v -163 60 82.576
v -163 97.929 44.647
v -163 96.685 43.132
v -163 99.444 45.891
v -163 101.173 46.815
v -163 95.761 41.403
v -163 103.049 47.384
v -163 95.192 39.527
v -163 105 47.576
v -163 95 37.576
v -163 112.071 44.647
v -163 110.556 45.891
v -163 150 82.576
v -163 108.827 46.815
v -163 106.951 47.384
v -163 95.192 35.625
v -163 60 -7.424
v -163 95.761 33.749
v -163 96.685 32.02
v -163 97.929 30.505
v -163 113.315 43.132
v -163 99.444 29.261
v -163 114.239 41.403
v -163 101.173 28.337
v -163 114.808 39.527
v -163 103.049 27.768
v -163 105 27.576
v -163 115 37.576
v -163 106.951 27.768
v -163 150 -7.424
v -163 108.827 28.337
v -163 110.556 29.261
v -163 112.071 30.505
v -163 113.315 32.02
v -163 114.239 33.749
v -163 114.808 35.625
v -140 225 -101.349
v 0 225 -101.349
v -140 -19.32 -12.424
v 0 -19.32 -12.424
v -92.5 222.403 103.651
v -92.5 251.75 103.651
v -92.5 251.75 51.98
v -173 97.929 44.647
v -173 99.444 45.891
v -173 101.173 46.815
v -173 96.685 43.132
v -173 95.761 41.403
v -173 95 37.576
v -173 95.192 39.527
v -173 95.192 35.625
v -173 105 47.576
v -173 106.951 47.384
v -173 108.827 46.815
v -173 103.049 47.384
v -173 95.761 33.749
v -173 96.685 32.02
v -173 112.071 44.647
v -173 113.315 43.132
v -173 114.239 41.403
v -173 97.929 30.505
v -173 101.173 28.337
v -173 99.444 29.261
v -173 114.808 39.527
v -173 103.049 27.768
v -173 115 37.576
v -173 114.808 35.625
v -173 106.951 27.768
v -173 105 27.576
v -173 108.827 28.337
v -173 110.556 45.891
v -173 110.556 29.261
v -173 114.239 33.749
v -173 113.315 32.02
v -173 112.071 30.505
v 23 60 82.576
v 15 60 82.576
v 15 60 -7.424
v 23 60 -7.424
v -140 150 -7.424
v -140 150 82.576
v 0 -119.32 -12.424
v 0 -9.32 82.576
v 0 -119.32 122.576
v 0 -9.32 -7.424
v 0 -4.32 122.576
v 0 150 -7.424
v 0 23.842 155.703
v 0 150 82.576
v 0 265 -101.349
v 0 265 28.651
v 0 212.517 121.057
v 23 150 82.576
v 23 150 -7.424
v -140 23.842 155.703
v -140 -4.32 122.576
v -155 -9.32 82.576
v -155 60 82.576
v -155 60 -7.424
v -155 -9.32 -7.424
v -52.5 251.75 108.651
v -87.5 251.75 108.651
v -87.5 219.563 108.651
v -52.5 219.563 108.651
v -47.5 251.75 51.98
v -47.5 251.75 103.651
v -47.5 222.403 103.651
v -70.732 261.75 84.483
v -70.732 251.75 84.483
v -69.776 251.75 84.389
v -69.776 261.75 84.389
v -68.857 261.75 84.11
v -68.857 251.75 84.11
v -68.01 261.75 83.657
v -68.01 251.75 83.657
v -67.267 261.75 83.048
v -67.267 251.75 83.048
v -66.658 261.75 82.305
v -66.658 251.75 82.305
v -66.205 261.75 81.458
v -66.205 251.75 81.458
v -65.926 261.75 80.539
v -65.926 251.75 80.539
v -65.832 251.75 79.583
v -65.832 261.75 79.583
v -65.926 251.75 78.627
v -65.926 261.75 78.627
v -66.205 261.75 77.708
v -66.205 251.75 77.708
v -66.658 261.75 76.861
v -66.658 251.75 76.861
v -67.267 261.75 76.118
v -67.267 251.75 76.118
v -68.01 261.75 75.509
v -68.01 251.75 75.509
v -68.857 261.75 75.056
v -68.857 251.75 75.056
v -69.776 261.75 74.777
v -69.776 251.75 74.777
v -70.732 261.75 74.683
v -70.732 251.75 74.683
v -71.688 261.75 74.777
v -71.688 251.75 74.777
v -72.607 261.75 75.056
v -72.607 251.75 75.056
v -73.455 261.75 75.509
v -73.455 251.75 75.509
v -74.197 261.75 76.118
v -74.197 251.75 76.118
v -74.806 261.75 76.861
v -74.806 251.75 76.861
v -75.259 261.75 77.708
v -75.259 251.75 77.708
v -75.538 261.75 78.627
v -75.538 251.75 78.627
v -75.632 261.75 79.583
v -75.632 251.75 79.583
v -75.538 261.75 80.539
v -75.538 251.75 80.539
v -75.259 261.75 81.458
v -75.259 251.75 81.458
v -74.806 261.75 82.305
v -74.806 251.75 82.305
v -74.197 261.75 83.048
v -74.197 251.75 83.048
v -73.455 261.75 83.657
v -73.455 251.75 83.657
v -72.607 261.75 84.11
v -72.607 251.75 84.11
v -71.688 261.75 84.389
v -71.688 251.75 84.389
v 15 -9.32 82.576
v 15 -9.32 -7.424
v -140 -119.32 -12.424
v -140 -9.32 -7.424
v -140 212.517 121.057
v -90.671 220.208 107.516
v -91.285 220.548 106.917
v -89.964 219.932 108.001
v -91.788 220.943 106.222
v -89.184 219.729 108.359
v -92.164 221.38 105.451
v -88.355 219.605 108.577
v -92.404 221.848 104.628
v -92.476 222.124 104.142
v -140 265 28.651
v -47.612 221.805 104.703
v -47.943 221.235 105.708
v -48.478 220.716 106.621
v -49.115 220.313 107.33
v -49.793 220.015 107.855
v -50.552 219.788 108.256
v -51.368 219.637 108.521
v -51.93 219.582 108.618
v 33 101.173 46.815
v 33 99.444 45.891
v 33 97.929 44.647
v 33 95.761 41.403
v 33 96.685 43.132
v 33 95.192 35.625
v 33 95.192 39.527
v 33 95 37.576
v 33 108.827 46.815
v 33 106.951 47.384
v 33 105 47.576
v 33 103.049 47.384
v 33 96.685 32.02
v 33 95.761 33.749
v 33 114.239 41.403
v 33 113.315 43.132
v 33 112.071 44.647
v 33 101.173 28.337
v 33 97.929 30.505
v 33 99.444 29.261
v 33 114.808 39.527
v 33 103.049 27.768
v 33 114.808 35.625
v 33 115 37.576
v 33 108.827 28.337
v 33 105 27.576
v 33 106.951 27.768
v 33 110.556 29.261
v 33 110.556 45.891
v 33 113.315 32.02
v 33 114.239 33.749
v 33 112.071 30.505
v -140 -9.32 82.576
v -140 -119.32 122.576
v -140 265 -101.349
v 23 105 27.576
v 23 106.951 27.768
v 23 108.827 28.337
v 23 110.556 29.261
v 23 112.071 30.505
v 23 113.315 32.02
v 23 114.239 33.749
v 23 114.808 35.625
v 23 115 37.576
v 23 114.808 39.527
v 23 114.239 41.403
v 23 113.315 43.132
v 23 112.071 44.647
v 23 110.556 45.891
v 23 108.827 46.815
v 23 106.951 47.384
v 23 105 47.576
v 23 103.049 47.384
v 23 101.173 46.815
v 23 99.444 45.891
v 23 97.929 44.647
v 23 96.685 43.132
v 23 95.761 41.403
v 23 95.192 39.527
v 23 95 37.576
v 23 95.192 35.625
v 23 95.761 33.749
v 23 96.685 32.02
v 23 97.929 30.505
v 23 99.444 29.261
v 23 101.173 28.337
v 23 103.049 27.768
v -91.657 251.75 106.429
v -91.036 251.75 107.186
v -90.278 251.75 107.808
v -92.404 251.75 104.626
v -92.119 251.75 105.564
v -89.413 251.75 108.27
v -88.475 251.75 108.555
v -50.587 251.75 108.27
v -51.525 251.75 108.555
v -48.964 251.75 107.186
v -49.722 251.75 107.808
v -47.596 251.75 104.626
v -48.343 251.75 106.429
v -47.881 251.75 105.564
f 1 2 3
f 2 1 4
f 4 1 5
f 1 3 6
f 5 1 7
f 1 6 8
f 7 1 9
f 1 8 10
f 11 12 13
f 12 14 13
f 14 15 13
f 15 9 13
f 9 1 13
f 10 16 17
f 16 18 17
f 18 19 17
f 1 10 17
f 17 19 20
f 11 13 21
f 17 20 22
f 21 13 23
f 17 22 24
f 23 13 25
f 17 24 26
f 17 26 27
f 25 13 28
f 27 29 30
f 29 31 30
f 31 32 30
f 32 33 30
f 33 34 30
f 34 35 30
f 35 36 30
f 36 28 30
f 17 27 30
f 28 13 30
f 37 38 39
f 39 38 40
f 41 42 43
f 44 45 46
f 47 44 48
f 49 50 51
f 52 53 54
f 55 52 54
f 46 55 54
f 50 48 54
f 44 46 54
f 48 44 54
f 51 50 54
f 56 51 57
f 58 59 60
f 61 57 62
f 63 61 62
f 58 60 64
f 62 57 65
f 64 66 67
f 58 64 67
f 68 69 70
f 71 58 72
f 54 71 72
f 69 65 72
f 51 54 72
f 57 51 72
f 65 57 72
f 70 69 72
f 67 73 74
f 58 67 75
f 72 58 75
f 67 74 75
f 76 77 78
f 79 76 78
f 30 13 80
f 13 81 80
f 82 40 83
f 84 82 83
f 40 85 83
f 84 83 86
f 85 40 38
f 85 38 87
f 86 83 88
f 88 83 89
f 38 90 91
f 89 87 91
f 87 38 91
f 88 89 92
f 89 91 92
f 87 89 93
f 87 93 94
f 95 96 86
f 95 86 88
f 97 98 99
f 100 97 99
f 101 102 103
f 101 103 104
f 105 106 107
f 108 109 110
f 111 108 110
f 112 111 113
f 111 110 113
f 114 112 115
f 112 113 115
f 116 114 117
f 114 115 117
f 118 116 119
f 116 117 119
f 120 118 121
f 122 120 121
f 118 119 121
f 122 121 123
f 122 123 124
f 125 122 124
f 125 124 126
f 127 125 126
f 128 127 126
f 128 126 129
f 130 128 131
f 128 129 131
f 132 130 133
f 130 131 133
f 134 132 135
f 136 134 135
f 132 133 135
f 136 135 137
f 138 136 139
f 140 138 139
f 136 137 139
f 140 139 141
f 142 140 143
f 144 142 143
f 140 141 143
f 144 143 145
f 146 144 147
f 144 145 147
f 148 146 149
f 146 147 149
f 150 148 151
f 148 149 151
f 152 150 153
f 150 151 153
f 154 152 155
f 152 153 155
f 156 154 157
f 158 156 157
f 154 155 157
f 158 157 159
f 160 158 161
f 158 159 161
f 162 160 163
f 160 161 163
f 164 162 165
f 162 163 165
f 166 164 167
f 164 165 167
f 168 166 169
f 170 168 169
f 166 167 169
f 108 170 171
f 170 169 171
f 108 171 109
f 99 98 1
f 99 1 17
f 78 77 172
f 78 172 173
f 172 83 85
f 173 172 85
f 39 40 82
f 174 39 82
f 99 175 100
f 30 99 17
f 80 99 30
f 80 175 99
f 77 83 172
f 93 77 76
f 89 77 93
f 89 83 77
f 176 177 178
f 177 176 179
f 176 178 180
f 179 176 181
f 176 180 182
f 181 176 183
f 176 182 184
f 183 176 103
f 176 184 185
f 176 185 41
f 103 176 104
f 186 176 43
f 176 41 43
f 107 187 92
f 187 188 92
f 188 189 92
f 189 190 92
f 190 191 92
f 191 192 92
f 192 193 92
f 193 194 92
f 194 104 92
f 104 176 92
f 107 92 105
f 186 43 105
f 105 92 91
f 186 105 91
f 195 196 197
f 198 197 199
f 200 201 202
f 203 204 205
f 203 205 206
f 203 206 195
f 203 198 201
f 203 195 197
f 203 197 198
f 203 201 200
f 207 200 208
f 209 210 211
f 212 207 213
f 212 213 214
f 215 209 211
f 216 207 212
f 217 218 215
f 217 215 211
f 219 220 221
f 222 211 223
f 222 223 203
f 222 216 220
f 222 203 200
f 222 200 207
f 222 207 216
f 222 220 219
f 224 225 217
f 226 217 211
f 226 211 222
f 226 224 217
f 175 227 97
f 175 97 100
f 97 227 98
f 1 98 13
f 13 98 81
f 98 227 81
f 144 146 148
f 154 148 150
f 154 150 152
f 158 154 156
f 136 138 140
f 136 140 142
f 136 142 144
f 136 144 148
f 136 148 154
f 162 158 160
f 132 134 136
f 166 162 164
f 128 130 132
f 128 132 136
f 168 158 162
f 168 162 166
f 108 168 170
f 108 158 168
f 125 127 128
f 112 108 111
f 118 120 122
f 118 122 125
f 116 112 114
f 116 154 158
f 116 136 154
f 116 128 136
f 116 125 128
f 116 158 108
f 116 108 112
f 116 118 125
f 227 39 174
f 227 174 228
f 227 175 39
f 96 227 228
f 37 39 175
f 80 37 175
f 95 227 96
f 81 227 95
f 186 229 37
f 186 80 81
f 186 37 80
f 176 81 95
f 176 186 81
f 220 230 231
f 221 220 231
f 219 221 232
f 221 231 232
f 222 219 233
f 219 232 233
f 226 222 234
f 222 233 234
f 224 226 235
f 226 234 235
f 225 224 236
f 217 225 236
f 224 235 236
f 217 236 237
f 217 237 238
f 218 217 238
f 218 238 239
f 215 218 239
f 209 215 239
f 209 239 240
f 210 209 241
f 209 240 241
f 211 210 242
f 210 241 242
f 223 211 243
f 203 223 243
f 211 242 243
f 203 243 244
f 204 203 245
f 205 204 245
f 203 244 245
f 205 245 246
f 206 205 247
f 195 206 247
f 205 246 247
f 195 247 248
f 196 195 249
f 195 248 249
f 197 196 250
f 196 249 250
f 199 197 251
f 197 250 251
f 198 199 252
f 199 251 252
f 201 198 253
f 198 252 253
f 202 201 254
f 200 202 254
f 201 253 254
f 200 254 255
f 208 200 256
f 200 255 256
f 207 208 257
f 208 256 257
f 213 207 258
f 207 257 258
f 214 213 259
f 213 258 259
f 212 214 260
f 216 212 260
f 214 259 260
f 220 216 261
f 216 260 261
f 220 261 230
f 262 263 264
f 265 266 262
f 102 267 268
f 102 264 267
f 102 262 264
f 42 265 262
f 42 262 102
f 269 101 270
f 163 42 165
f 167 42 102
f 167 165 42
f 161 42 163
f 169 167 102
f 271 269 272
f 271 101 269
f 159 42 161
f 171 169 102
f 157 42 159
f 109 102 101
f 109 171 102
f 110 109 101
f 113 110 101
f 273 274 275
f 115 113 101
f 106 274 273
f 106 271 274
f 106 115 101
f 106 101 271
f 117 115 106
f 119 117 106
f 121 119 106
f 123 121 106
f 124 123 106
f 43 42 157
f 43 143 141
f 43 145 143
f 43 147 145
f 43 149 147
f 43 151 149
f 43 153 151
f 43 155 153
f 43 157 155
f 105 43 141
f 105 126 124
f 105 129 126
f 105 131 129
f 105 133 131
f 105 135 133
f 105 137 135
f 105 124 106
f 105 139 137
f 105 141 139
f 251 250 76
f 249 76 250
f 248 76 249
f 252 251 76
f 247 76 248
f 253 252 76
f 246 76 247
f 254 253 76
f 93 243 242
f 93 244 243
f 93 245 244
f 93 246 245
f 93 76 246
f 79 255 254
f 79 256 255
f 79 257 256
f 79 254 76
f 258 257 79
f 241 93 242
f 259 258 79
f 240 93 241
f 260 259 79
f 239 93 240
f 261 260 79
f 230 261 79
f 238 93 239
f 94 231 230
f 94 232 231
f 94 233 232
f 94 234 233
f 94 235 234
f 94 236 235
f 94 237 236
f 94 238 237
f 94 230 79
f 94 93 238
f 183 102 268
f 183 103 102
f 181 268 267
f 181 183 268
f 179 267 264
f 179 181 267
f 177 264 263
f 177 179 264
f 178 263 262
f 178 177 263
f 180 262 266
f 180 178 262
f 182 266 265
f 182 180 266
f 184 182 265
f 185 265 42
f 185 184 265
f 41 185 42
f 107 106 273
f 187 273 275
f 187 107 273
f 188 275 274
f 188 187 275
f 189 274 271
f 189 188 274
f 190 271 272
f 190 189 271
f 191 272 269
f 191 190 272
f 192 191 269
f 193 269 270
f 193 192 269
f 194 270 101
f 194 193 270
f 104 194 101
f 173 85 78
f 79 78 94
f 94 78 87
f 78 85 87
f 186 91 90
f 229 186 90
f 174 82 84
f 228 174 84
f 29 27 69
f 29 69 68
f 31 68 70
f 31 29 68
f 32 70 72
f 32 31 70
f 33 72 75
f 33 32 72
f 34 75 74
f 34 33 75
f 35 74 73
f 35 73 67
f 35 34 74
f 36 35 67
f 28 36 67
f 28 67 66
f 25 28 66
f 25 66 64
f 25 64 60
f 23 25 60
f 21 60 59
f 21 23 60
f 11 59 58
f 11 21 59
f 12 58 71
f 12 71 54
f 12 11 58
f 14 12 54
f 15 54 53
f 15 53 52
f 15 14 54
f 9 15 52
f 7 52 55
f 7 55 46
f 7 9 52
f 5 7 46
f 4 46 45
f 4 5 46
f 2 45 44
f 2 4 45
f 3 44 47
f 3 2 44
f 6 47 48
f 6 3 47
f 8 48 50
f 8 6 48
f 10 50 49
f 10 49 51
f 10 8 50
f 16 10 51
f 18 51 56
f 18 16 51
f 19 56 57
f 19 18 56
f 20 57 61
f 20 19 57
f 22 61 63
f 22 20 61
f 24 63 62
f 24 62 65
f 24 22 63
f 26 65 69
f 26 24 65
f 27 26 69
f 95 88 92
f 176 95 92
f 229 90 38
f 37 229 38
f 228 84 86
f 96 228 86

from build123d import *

# Parameters (mm, degrees)
BOSS_EXTRUDE1_DEPTH = 140
BOSS_EXTRUDE2_REACH = 428.071
SKETCH2_W           = 45
SKETCH2_H           = 60
FILLET3_R           = 5
SKETCH3_R           = 4.9
BOSS_EXTRUDE3_DEPTH = 10
SKETCH5_W           = 90
SKETCH5_H           = 159.320081404
BOSS_EXTRUDE4_DEPTH = 15
SKETCH6_W           = 90
SKETCH6_H           = 90
BOSS_EXTRUDE5_DEPTH = 8
SKETCH7_R           = 10
BOSS_EXTRUDE6_DEPTH = 10


with BuildPart() as part:
    # Sketch1 → Boss-Extrude1 (new body)
    with BuildSketch(Plane(origin=(0, 0, 0), x_dir=(0, 0, -1), z_dir=(1, 0, 0))):
        Polygon((-28.65072374, 264.999954135), (101.34927626, 264.999954135), (101.34927626, 224.999954135), (12.424038995, -19.320127269), (12.424038995, -119.320127269), (-122.575961005, -119.320127269), (-122.575961005, -4.320127269), (-155.703127425, 23.841926011), (-121.056779311, 212.517254187), align=None)
    extrude(amount=-BOSS_EXTRUDE1_DEPTH)

    # Boss-Extrude2: up to this face of the body (flat: up to its plane)
    boss_extrude2_end = Plane(part.part.faces().sort_by_distance((-70, 238.758604161, 74.853751525))[0])
    # Sketch2 → Boss-Extrude2 (add, up to the picked face)
    with BuildSketch(Plane(origin=(0, 251.749954135, 0), x_dir=(1, 0, 0), z_dir=(0, 1, 0)), mode=Mode.PRIVATE) as boss_extrude2_sk1:
        with Locations((-70, -78.65072374)):
            Rectangle(SKETCH2_W, SKETCH2_H)
    boss_extrude2_tool1 = split(extrude(boss_extrude2_sk1.sketch, amount=-BOSS_EXTRUDE2_REACH, mode=Mode.PRIVATE), bisect_by=boss_extrude2_end, keep=Keep.BOTH, mode=Mode.PRIVATE)
    add(boss_extrude2_tool1.solids().sort_by(Axis((-70, 251.749954, 78.650724), (0, -1, 0)))[0])

    # Fillet3
    fillet3_edges = [part.edges().sort_by_distance(p)[0] for p in [
        (-47.5, 235.656659485, 108.65072374),
        (-92.5, 235.656659485, 108.65072374),
    ]]
    fillet(fillet3_edges, radius=FILLET3_R)

    # Sketch3 → Boss-Extrude3 (add)
    with BuildSketch(Plane(origin=(0, 251.749954135, 0), x_dir=(1, 0, 0), z_dir=(0, 1, 0))):
        with Locations(Location((-70.732233047, -79.583098626, 0), (0, 0, 270))):
            Circle(SKETCH3_R)
    extrude(amount=BOSS_EXTRUDE3_DEPTH)

    # Sketch5 → Boss-Extrude4 (add)
    with BuildSketch(Plane(origin=(0, 0, 0), x_dir=(0, 0, -1), z_dir=(1, 0, 0))):
        with Locations((-37.575961005, 70.339913433)):
            Rectangle(SKETCH5_W, SKETCH5_H)
    boss_extrude4 = extrude(amount=BOSS_EXTRUDE4_DEPTH)

    # Sketch6 → Boss-Extrude5 (add)
    with BuildSketch(Plane(origin=(15, 0, 0), x_dir=(0, 0, -1), z_dir=(1, 0, 0))):
        with Locations((-37.575961005, 104.999954135)):
            Rectangle(SKETCH6_W, SKETCH6_H)
    boss_extrude5 = extrude(amount=BOSS_EXTRUDE5_DEPTH)

    # Sketch7 → Boss-Extrude6 (add)
    with BuildSketch(Plane(origin=(23, 0, 0), x_dir=(0, 0, -1), z_dir=(1, 0, 0))):
        with Locations((-37.575961005, 104.999954135)):
            Circle(SKETCH7_R)
    boss_extrude6 = extrude(amount=BOSS_EXTRUDE6_DEPTH)

    # Mirror1: Boss-Extrude4, Boss-Extrude5, Boss-Extrude6 across plane
    add(boss_extrude4.mirror(Plane(origin=(-70, 0, 0), x_dir=(0, 0, 1), z_dir=(1, 0, 0))))
    add(boss_extrude5.mirror(Plane(origin=(-70, 0, 0), x_dir=(0, 0, 1), z_dir=(1, 0, 0))))
    add(boss_extrude6.mirror(Plane(origin=(-70, 0, 0), x_dir=(0, 0, 1), z_dir=(1, 0, 0))))


solid = part.part
